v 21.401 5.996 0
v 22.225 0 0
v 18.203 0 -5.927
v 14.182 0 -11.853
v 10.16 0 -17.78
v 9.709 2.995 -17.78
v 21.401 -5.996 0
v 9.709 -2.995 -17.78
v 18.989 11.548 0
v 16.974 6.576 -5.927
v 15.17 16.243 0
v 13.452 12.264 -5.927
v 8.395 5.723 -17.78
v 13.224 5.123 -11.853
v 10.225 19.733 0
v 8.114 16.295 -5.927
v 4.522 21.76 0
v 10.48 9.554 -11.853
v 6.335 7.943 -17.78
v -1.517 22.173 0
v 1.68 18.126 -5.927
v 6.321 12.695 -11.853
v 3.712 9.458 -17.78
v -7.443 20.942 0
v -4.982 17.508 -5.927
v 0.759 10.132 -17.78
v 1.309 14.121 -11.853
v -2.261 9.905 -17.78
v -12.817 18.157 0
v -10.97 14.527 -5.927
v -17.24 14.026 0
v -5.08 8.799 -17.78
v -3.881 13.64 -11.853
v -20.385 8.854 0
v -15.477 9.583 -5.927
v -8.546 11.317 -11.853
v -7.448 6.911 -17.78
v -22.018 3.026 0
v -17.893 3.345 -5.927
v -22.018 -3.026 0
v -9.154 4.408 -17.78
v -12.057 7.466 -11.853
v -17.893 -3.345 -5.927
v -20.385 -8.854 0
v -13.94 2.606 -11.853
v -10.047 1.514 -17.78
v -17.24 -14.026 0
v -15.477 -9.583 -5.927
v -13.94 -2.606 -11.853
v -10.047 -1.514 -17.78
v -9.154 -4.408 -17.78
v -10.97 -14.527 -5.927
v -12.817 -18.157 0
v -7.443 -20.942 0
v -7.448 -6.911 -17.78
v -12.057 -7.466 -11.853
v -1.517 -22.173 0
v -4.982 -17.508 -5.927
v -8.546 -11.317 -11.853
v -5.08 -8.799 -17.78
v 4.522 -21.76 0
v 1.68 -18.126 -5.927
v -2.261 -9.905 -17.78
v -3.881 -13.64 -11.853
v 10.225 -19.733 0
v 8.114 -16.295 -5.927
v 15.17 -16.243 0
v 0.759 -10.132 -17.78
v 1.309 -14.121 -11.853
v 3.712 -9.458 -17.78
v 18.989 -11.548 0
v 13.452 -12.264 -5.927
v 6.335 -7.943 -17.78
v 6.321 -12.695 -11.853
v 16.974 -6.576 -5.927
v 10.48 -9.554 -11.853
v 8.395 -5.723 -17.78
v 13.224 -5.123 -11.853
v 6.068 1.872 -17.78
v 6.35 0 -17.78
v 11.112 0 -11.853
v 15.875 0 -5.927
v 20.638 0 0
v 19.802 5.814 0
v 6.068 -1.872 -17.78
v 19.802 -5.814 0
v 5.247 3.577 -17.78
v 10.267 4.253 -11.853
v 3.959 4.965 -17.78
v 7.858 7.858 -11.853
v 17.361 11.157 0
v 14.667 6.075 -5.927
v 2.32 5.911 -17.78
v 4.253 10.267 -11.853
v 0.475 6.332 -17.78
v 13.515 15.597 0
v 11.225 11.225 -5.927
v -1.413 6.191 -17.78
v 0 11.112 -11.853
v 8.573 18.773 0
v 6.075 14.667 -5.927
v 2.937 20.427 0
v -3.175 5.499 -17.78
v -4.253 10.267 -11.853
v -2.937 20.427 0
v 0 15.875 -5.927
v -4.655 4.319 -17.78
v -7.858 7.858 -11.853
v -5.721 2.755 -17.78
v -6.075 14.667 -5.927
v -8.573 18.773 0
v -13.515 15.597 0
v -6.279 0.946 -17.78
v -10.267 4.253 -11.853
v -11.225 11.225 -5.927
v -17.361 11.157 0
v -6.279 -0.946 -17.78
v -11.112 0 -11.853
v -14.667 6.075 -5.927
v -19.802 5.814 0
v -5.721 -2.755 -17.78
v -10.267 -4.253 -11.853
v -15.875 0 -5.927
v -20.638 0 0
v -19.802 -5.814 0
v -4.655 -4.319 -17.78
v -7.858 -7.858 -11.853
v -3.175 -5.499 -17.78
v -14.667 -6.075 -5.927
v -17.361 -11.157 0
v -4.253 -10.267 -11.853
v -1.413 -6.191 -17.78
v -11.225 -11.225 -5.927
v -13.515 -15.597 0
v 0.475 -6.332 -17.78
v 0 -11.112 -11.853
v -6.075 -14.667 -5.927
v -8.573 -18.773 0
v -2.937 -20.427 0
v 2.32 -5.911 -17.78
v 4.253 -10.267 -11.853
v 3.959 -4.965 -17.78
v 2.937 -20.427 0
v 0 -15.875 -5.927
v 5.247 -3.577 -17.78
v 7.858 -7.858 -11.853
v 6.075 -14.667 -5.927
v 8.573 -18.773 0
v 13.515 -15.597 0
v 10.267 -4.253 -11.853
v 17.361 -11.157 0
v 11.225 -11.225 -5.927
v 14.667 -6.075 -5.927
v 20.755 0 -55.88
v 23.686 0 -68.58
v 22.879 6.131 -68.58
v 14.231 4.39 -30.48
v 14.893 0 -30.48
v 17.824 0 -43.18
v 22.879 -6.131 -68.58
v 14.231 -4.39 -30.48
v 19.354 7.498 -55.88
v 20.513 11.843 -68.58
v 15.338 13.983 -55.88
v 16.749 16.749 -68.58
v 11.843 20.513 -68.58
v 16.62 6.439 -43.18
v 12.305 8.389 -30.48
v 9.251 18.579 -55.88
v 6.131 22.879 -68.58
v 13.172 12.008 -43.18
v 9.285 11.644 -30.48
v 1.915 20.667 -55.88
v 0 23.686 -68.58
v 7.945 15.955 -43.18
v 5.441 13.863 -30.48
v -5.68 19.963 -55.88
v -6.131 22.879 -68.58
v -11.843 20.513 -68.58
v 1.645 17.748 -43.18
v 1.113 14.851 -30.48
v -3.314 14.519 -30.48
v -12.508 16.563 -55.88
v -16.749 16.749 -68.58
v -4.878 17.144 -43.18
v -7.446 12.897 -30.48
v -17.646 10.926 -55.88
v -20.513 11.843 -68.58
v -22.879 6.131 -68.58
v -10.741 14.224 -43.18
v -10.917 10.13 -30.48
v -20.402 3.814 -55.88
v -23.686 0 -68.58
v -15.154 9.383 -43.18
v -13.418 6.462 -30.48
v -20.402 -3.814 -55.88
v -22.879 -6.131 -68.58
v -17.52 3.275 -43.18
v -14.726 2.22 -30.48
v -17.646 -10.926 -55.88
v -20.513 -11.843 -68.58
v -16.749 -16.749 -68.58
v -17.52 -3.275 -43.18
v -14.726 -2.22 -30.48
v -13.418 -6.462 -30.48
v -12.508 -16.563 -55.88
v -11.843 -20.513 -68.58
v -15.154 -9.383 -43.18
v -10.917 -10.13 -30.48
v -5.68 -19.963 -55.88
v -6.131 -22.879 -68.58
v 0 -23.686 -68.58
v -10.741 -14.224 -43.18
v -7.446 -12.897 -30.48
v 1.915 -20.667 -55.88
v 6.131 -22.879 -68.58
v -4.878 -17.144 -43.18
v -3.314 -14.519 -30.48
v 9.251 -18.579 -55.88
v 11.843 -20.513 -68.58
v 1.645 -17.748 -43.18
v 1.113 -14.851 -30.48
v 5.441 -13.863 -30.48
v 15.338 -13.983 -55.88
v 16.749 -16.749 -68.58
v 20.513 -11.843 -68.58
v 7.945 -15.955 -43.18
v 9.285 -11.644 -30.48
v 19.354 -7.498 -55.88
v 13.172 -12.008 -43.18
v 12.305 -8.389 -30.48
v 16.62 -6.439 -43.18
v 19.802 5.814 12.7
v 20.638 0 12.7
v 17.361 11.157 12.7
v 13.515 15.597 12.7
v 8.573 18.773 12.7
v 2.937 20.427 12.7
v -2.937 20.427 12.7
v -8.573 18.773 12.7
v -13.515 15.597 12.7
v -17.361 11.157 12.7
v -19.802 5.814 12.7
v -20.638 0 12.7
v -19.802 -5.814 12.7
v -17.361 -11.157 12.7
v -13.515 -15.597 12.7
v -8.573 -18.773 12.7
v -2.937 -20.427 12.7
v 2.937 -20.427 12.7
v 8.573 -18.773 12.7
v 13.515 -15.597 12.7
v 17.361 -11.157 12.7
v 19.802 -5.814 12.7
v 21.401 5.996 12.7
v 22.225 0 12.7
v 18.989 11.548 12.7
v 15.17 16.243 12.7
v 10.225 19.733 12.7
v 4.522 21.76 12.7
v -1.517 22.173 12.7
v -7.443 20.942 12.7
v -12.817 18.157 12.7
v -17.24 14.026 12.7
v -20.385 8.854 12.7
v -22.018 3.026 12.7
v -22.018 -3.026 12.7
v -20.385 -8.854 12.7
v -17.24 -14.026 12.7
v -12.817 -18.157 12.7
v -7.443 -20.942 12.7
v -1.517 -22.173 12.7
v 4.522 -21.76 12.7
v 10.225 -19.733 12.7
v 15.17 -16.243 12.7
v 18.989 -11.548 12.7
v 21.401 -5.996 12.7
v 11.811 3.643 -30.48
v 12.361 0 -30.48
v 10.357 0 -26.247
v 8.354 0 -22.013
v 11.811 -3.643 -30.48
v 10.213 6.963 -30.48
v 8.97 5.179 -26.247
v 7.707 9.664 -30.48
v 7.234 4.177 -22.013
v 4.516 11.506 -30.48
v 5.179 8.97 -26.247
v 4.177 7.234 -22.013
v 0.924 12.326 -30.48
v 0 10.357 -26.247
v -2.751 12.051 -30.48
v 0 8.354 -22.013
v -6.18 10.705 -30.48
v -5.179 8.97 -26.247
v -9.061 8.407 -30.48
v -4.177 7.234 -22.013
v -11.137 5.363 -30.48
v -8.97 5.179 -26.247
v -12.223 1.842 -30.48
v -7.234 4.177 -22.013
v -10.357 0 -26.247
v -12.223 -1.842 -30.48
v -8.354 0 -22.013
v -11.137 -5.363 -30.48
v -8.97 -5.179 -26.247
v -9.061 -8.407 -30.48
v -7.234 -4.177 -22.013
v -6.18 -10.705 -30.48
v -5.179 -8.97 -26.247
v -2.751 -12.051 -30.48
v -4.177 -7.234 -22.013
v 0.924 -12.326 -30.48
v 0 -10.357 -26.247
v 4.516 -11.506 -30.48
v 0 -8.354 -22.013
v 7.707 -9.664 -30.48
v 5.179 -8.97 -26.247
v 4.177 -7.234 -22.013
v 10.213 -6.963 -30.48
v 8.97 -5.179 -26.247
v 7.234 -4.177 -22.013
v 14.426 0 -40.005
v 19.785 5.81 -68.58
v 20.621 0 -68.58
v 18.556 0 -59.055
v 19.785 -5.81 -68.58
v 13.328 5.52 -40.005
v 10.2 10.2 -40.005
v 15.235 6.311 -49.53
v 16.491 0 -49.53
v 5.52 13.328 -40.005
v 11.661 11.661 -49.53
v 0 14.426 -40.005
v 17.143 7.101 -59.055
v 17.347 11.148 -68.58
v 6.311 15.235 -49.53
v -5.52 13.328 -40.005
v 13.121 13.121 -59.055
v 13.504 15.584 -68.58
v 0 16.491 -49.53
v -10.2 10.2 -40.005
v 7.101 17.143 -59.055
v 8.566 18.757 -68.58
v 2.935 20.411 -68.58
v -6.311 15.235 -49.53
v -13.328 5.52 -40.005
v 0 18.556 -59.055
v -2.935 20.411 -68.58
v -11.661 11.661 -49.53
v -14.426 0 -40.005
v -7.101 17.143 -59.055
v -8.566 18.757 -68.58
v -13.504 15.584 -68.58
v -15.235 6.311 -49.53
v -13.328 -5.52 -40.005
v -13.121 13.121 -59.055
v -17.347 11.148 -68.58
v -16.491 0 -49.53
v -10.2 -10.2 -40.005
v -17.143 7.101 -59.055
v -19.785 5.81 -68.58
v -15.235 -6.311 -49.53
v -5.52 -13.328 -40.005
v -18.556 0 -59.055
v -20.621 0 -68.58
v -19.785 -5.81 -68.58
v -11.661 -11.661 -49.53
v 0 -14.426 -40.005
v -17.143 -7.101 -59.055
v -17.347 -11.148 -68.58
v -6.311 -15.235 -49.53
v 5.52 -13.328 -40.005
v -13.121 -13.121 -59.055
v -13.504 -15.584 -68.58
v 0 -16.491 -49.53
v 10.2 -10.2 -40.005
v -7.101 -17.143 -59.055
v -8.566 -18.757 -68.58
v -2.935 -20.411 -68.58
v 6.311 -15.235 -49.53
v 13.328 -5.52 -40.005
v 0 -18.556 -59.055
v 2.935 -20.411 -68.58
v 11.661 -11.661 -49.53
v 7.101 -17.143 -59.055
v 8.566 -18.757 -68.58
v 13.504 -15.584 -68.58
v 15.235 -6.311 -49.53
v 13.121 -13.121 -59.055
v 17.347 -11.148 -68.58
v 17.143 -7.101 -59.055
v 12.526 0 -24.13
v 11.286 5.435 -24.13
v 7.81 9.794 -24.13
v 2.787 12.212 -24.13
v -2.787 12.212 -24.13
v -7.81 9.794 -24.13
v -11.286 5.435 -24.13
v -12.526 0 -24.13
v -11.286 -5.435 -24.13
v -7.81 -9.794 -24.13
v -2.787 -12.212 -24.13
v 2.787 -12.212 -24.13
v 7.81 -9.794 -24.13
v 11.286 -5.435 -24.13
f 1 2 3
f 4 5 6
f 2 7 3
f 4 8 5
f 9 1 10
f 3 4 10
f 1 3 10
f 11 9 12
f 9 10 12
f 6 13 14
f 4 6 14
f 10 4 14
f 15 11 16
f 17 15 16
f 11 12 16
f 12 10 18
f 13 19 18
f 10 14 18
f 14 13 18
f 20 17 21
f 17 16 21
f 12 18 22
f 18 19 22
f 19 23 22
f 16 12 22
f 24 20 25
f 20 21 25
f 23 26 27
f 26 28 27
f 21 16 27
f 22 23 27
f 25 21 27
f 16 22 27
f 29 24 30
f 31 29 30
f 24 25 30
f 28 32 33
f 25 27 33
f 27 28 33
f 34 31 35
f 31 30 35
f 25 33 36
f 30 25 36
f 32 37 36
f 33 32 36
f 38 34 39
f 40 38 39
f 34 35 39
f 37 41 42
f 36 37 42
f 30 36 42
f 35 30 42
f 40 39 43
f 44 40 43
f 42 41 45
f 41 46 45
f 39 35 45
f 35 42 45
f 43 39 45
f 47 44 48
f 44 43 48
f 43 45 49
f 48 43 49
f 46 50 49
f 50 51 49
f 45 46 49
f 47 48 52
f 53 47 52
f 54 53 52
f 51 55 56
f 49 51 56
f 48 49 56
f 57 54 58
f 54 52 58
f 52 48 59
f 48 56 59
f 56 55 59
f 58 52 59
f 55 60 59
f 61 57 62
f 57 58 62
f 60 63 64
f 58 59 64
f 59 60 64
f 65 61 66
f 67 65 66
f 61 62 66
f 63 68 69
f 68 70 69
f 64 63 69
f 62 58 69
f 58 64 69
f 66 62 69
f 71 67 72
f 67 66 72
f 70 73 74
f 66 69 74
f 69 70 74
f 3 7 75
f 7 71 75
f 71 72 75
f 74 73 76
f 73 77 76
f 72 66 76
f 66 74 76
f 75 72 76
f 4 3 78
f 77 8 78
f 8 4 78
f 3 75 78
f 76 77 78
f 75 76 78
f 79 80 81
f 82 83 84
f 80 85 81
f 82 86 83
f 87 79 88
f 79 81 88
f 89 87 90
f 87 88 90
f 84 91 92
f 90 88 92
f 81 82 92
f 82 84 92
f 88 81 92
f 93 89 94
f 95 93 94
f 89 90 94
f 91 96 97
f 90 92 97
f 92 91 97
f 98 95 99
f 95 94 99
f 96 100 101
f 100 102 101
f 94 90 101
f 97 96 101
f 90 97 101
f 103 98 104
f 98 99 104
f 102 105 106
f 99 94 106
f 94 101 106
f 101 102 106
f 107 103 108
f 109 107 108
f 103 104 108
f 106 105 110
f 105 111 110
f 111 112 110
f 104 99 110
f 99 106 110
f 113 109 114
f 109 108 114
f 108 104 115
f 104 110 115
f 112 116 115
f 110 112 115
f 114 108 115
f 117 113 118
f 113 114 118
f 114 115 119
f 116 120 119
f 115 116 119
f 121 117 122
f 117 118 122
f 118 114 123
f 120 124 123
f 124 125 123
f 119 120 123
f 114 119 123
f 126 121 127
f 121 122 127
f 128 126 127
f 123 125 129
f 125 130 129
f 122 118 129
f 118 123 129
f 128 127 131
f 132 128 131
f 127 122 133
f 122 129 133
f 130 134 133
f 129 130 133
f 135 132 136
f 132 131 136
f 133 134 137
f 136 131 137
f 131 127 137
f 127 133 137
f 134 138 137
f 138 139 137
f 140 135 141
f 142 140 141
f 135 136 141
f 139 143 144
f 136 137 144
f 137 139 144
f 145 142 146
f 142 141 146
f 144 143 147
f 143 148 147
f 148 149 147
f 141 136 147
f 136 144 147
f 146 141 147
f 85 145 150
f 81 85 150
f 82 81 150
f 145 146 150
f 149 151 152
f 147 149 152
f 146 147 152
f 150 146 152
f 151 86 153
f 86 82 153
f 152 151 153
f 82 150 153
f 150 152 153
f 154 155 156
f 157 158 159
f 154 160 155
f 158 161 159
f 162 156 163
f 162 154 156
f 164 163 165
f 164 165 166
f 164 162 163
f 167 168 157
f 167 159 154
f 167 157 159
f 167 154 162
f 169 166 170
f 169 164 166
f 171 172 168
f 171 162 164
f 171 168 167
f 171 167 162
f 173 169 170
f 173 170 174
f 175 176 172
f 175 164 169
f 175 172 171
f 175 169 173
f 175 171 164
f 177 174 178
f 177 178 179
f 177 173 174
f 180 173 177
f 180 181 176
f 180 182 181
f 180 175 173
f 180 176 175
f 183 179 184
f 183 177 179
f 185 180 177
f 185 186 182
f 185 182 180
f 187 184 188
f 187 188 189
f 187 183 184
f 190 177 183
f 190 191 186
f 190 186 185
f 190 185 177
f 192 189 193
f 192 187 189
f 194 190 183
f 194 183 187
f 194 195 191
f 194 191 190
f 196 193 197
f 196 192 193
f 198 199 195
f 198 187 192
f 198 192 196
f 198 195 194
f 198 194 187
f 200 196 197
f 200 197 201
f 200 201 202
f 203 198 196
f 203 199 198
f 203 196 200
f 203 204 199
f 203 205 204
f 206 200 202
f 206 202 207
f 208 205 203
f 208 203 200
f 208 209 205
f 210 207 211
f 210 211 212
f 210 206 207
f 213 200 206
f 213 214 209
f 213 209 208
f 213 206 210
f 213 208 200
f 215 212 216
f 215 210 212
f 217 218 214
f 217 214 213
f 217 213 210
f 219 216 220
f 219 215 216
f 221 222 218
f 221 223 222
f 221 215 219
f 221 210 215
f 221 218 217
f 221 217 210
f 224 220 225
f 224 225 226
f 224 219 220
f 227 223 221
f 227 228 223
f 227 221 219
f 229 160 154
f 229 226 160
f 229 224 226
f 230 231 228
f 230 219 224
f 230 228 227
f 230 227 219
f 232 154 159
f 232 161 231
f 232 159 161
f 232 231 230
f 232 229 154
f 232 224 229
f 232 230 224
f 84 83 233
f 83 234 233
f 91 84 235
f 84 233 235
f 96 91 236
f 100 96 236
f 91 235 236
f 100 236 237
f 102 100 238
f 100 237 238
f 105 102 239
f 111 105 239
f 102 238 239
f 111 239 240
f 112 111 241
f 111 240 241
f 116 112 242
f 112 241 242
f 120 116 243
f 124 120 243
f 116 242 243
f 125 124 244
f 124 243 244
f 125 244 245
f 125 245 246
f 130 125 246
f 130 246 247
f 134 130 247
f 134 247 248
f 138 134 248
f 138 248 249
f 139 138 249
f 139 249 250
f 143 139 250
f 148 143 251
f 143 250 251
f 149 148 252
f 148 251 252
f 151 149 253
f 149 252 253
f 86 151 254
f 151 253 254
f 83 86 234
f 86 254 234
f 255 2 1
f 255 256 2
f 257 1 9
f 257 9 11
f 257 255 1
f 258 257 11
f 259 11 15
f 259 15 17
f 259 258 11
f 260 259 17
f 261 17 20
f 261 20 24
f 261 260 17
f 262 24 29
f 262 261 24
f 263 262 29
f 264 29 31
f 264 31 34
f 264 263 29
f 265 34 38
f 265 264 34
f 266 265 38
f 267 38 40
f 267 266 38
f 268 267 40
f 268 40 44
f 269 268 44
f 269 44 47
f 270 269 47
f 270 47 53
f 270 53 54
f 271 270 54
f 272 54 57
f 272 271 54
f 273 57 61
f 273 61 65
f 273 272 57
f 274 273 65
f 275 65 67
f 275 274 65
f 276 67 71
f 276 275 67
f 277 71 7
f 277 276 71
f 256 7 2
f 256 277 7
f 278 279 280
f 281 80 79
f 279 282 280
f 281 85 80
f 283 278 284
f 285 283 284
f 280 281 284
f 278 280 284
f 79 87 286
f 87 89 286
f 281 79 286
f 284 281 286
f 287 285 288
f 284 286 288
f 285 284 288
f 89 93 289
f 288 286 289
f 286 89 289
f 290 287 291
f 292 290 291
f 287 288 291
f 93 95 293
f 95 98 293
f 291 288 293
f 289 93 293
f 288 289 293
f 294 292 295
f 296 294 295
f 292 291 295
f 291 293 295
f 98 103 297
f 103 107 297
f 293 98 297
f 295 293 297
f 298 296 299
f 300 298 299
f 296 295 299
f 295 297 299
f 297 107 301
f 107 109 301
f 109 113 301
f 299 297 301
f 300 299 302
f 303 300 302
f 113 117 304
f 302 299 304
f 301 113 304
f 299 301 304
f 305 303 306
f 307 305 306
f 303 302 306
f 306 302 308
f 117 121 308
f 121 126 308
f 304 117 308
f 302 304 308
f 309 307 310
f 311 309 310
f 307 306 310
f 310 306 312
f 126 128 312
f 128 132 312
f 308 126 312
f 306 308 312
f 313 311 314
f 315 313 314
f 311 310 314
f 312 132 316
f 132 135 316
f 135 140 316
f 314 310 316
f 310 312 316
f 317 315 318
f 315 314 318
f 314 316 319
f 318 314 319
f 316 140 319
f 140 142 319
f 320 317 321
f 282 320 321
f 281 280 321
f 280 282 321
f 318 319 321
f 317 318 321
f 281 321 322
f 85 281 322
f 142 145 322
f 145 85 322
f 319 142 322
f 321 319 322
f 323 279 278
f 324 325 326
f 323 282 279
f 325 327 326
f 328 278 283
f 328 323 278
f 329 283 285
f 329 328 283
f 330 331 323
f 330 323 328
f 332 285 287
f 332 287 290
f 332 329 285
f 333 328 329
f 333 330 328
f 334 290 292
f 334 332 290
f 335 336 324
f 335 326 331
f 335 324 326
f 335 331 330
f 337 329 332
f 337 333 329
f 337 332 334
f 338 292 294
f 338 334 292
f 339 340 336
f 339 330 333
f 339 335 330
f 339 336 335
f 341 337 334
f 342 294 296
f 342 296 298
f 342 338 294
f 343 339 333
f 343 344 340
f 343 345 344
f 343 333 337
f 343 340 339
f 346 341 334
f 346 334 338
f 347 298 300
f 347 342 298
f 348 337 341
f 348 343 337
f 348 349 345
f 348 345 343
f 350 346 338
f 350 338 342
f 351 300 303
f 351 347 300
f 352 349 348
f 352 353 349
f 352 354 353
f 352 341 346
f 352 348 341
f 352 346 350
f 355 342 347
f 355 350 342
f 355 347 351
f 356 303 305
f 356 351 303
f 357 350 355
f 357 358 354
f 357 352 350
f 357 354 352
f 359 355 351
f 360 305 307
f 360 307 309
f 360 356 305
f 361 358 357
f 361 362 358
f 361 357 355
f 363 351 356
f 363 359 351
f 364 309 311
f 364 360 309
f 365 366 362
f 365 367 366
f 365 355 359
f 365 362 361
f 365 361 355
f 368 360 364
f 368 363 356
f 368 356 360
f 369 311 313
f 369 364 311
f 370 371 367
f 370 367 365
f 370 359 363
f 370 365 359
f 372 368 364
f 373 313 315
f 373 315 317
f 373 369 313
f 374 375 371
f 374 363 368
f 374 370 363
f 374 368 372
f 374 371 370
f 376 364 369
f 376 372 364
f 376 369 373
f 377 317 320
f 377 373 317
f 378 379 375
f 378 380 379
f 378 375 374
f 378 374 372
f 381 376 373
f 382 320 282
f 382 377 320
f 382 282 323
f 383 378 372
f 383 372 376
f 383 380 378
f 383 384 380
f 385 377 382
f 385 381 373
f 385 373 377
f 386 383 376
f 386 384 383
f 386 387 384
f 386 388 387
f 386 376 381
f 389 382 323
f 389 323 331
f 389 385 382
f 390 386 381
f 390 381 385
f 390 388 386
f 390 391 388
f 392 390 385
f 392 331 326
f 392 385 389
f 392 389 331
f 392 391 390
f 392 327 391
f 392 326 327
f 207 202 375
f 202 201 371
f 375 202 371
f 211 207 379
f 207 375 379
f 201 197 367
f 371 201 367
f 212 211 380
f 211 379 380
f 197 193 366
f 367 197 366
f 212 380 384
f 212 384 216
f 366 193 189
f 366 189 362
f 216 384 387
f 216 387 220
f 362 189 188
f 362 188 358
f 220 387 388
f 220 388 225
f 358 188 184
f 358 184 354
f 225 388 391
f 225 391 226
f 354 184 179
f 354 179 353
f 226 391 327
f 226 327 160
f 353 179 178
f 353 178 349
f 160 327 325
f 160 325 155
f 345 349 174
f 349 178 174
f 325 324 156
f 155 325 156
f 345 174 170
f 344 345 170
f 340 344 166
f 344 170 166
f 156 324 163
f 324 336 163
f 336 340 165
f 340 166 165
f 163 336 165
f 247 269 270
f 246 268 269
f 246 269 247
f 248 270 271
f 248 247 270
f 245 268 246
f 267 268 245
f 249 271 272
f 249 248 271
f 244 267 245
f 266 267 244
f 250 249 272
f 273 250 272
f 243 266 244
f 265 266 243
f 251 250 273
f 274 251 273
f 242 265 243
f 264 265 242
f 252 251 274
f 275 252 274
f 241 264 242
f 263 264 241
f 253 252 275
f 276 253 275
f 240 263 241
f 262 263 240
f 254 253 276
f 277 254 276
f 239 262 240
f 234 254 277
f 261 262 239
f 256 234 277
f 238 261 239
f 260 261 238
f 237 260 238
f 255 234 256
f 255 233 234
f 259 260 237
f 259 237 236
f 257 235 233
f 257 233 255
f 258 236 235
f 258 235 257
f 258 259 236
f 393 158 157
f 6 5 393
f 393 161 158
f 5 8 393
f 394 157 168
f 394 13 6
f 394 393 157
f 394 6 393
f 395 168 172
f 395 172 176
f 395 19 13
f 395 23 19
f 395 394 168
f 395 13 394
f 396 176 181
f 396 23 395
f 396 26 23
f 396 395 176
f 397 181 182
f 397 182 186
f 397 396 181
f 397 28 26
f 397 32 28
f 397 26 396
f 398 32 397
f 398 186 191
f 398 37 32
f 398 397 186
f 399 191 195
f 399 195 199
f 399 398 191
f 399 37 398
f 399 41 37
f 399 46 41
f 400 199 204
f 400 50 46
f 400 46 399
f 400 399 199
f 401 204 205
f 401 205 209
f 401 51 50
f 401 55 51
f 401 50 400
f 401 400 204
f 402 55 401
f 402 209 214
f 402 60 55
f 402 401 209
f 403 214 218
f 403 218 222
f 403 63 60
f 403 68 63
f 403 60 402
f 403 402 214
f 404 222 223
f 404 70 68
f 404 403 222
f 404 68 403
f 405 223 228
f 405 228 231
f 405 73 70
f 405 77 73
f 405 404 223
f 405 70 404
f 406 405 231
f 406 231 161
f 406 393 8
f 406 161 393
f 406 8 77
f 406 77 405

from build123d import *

# Parameters (mm, degrees)
F1_R  = 22.225
F4_R  = 22.225
F0_R  = 20.6375
F3_R  = 20.6375
F9_R  = 10.16
F8_R  = 6.35
F16_R = 14.892743
F15_R = 12.360635
F19_R = 23.686473
F13_R = 20.620664


with BuildPart() as f5:
    # F1 (on Top) → F5 section 0
    with BuildSketch(Plane.XY):
        Circle(F1_R)
    # F4 (on offset) → F5 section 1
    with BuildSketch(Plane.XY.offset(12.7)):
        Circle(F4_R)
    loft()

    # F0 (on Top) → F6 section 0
    with BuildSketch(Plane.XY):
        Circle(F0_R)
    # F3 (on offset) → F6 section 1
    with BuildSketch(Plane.XY.offset(12.7)):
        Circle(F3_R)
    loft(mode=Mode.SUBTRACT)

    # F1 (on Top) → F10 section 0
    with BuildSketch(Plane.XY):
        Circle(F1_R)
    # F9 (on offset) → F10 section 1
    with BuildSketch(Plane.XY.offset(-17.78)):
        Circle(F9_R)
    loft()

    # F8 (on offset) → F11 section 0
    with BuildSketch(Plane.XY.offset(-17.78)):
        Circle(F8_R)
    # F0 (on Top) → F11 section 1
    with BuildSketch(Plane.XY):
        Circle(F0_R)
    loft(mode=Mode.SUBTRACT)

    # F16 (on offset) → F17 section 0
    with BuildSketch(Plane.XY.offset(-30.48)):
        Circle(F16_R)
    # F9 (on offset) → F17 section 1
    with BuildSketch(Plane.XY.offset(-17.78)):
        Circle(F9_R)
    loft()

    # F15 (on offset) → F18 section 0
    with BuildSketch(Plane.XY.offset(-30.48)):
        Circle(F15_R)
    # F8 (on offset) → F18 section 1
    with BuildSketch(Plane.XY.offset(-17.78)):
        Circle(F8_R)
    loft(mode=Mode.SUBTRACT)

    # F19 (on offset) → F20 section 0
    with BuildSketch(Plane.XY.offset(-68.58)):
        Circle(F19_R)
    # F16 (on offset) → F20 section 1
    with BuildSketch(Plane.XY.offset(-30.48)):
        Circle(F16_R)
    loft()

    # F15 (on offset) → F21 section 0
    with BuildSketch(Plane.XY.offset(-30.48)):
        Circle(F15_R)
    # F13 (on offset) → F21 section 1
    with BuildSketch(Plane.XY.offset(-68.58)):
        Circle(F13_R)
    loft(mode=Mode.SUBTRACT)


solid = f5.part
